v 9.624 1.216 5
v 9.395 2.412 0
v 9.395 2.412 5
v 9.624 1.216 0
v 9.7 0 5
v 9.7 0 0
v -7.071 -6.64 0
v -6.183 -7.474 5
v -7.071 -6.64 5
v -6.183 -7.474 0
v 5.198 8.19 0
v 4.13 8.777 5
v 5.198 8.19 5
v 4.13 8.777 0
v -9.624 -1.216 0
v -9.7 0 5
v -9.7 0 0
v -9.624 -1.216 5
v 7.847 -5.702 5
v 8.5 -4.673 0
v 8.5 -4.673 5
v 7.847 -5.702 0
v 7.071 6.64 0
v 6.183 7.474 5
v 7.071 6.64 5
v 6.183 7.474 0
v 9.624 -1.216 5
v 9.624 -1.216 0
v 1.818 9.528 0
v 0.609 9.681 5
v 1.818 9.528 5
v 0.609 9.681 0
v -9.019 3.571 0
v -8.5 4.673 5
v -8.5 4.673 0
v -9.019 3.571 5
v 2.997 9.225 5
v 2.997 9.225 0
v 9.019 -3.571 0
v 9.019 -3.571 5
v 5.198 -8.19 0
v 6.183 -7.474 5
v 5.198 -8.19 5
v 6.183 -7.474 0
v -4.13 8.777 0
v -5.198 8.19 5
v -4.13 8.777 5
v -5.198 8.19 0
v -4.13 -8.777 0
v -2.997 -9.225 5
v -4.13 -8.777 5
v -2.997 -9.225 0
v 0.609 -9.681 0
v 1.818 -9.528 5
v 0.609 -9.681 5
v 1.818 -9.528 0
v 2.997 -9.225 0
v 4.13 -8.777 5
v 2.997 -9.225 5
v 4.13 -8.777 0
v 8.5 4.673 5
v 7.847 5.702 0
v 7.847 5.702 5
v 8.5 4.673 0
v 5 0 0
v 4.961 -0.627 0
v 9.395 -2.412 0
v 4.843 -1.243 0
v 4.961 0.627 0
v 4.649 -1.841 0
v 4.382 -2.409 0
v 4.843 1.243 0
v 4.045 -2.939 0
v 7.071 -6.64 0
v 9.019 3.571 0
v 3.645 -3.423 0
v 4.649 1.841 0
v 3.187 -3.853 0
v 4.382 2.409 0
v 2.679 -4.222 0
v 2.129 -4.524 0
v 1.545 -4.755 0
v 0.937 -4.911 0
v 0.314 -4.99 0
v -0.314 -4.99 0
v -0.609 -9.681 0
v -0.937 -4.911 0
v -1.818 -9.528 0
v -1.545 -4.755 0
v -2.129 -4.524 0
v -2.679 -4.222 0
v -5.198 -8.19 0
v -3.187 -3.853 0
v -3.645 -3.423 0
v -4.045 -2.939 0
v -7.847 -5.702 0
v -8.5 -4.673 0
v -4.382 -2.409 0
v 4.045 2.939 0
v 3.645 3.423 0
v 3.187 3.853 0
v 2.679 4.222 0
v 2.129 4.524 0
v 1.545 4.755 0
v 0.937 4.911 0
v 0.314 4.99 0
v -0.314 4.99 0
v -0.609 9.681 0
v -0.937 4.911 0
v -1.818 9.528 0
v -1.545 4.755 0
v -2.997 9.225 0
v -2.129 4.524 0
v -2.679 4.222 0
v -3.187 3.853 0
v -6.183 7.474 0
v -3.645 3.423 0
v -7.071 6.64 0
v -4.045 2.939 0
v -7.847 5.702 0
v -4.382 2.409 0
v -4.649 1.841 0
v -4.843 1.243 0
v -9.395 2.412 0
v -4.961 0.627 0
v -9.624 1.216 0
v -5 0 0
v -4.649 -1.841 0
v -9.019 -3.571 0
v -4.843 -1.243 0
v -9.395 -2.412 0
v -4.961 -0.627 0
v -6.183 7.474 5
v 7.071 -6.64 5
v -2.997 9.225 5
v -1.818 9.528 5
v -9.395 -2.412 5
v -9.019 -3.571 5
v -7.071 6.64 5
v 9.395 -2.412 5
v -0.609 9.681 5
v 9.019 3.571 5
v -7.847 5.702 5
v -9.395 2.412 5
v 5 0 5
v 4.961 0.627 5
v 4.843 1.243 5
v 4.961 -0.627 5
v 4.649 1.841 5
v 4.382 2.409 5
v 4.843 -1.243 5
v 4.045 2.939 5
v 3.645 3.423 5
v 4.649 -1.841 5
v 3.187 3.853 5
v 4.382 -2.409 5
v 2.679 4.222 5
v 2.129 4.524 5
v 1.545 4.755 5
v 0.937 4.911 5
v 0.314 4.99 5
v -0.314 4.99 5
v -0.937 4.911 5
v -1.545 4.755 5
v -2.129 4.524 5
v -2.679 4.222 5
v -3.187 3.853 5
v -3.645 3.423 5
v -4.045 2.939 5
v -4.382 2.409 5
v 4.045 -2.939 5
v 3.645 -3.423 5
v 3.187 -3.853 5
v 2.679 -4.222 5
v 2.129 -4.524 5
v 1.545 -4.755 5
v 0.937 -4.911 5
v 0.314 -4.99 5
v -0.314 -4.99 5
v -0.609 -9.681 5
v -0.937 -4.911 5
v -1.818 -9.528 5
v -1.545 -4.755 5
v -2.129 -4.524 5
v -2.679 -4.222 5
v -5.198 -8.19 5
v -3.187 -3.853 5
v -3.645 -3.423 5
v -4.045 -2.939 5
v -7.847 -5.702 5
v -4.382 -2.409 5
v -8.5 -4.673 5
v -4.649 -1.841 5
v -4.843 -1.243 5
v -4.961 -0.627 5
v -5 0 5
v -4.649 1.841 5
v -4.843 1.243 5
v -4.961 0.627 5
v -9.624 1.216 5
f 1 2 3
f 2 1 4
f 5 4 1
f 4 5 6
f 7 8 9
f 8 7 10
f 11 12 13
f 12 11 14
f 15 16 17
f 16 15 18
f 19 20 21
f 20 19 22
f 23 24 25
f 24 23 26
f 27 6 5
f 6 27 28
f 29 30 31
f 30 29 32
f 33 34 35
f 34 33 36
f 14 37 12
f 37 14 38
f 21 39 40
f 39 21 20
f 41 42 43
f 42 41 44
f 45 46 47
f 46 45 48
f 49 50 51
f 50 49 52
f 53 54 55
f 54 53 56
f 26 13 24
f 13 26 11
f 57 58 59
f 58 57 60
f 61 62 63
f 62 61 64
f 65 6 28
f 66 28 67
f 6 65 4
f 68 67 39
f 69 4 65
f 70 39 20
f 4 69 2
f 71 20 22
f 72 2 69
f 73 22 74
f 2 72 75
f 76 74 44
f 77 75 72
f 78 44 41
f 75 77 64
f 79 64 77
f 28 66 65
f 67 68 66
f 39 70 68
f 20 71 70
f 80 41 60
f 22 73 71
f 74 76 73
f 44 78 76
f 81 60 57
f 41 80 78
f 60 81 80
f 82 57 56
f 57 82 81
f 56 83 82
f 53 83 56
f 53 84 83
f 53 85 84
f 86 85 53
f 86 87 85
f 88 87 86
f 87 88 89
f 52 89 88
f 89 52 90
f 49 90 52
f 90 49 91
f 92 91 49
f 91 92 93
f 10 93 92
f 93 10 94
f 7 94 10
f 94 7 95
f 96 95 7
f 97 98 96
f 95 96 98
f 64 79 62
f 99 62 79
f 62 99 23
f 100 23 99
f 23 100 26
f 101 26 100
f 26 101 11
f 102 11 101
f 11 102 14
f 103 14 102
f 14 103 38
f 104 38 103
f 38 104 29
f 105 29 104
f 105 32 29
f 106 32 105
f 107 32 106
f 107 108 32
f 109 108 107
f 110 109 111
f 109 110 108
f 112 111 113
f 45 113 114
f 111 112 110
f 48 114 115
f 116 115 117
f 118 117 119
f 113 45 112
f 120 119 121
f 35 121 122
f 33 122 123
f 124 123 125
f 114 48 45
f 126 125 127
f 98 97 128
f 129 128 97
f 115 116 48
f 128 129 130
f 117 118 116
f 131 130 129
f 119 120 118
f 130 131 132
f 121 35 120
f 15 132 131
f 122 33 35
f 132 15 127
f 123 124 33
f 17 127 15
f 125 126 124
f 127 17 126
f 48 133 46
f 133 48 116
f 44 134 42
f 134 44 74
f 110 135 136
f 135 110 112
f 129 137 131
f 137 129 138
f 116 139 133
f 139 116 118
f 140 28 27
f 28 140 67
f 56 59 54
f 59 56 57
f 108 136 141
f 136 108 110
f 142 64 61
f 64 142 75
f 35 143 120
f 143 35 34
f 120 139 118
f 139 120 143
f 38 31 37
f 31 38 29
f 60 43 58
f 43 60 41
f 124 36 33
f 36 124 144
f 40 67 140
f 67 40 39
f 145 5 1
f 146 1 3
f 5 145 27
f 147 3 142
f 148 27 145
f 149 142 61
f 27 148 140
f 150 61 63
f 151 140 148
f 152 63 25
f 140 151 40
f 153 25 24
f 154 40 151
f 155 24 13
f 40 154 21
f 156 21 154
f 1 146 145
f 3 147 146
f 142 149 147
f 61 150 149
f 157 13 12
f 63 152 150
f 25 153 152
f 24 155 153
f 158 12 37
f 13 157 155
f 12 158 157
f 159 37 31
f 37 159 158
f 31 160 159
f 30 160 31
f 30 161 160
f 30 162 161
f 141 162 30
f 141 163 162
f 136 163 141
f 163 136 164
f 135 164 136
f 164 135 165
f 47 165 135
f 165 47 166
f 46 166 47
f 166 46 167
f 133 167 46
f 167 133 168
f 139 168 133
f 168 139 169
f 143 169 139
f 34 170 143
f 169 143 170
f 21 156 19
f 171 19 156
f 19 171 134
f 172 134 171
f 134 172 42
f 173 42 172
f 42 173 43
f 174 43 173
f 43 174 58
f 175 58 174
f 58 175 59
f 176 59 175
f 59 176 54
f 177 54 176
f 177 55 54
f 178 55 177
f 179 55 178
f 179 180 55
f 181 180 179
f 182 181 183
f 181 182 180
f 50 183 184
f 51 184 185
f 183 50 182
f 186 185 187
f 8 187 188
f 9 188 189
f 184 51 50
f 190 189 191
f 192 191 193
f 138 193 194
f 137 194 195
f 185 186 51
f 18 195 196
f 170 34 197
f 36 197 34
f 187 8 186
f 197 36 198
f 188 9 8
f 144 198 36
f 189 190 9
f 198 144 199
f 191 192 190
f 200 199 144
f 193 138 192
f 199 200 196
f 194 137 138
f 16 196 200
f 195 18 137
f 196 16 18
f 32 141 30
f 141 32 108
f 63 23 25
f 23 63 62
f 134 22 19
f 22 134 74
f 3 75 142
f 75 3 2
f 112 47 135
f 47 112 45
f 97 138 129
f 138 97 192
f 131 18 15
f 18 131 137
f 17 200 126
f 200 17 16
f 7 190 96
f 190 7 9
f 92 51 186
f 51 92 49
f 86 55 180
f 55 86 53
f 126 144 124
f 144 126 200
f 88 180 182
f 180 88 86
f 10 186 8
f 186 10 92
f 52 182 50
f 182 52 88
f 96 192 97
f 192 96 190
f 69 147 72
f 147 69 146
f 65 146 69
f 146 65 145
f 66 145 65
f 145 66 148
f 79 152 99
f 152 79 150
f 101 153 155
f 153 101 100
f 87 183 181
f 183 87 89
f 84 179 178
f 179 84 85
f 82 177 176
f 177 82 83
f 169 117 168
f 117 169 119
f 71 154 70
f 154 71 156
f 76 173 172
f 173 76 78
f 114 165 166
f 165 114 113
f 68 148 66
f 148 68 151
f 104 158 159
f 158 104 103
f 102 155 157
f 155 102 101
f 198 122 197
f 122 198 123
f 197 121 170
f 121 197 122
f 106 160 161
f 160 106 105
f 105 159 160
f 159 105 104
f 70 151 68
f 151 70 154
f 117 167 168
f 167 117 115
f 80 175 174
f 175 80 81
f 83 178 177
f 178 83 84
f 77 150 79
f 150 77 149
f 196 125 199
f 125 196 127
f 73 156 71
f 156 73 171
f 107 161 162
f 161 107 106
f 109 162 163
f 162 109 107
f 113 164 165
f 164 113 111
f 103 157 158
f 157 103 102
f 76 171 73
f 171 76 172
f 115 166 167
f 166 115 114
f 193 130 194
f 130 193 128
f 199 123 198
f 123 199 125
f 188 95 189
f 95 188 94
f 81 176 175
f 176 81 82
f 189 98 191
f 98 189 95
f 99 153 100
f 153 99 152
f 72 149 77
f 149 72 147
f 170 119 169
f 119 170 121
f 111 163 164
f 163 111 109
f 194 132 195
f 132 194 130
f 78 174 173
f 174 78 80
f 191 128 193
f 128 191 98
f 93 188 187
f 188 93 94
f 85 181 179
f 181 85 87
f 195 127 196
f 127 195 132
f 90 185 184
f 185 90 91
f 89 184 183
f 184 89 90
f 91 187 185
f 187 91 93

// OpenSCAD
$fn = 50;


difference() {
	union() {
		cylinder(h = 5, r = 9.7000000000);
	}
	union() {
		cylinder(h = 5, r = 5.0000000000);
	}
}
